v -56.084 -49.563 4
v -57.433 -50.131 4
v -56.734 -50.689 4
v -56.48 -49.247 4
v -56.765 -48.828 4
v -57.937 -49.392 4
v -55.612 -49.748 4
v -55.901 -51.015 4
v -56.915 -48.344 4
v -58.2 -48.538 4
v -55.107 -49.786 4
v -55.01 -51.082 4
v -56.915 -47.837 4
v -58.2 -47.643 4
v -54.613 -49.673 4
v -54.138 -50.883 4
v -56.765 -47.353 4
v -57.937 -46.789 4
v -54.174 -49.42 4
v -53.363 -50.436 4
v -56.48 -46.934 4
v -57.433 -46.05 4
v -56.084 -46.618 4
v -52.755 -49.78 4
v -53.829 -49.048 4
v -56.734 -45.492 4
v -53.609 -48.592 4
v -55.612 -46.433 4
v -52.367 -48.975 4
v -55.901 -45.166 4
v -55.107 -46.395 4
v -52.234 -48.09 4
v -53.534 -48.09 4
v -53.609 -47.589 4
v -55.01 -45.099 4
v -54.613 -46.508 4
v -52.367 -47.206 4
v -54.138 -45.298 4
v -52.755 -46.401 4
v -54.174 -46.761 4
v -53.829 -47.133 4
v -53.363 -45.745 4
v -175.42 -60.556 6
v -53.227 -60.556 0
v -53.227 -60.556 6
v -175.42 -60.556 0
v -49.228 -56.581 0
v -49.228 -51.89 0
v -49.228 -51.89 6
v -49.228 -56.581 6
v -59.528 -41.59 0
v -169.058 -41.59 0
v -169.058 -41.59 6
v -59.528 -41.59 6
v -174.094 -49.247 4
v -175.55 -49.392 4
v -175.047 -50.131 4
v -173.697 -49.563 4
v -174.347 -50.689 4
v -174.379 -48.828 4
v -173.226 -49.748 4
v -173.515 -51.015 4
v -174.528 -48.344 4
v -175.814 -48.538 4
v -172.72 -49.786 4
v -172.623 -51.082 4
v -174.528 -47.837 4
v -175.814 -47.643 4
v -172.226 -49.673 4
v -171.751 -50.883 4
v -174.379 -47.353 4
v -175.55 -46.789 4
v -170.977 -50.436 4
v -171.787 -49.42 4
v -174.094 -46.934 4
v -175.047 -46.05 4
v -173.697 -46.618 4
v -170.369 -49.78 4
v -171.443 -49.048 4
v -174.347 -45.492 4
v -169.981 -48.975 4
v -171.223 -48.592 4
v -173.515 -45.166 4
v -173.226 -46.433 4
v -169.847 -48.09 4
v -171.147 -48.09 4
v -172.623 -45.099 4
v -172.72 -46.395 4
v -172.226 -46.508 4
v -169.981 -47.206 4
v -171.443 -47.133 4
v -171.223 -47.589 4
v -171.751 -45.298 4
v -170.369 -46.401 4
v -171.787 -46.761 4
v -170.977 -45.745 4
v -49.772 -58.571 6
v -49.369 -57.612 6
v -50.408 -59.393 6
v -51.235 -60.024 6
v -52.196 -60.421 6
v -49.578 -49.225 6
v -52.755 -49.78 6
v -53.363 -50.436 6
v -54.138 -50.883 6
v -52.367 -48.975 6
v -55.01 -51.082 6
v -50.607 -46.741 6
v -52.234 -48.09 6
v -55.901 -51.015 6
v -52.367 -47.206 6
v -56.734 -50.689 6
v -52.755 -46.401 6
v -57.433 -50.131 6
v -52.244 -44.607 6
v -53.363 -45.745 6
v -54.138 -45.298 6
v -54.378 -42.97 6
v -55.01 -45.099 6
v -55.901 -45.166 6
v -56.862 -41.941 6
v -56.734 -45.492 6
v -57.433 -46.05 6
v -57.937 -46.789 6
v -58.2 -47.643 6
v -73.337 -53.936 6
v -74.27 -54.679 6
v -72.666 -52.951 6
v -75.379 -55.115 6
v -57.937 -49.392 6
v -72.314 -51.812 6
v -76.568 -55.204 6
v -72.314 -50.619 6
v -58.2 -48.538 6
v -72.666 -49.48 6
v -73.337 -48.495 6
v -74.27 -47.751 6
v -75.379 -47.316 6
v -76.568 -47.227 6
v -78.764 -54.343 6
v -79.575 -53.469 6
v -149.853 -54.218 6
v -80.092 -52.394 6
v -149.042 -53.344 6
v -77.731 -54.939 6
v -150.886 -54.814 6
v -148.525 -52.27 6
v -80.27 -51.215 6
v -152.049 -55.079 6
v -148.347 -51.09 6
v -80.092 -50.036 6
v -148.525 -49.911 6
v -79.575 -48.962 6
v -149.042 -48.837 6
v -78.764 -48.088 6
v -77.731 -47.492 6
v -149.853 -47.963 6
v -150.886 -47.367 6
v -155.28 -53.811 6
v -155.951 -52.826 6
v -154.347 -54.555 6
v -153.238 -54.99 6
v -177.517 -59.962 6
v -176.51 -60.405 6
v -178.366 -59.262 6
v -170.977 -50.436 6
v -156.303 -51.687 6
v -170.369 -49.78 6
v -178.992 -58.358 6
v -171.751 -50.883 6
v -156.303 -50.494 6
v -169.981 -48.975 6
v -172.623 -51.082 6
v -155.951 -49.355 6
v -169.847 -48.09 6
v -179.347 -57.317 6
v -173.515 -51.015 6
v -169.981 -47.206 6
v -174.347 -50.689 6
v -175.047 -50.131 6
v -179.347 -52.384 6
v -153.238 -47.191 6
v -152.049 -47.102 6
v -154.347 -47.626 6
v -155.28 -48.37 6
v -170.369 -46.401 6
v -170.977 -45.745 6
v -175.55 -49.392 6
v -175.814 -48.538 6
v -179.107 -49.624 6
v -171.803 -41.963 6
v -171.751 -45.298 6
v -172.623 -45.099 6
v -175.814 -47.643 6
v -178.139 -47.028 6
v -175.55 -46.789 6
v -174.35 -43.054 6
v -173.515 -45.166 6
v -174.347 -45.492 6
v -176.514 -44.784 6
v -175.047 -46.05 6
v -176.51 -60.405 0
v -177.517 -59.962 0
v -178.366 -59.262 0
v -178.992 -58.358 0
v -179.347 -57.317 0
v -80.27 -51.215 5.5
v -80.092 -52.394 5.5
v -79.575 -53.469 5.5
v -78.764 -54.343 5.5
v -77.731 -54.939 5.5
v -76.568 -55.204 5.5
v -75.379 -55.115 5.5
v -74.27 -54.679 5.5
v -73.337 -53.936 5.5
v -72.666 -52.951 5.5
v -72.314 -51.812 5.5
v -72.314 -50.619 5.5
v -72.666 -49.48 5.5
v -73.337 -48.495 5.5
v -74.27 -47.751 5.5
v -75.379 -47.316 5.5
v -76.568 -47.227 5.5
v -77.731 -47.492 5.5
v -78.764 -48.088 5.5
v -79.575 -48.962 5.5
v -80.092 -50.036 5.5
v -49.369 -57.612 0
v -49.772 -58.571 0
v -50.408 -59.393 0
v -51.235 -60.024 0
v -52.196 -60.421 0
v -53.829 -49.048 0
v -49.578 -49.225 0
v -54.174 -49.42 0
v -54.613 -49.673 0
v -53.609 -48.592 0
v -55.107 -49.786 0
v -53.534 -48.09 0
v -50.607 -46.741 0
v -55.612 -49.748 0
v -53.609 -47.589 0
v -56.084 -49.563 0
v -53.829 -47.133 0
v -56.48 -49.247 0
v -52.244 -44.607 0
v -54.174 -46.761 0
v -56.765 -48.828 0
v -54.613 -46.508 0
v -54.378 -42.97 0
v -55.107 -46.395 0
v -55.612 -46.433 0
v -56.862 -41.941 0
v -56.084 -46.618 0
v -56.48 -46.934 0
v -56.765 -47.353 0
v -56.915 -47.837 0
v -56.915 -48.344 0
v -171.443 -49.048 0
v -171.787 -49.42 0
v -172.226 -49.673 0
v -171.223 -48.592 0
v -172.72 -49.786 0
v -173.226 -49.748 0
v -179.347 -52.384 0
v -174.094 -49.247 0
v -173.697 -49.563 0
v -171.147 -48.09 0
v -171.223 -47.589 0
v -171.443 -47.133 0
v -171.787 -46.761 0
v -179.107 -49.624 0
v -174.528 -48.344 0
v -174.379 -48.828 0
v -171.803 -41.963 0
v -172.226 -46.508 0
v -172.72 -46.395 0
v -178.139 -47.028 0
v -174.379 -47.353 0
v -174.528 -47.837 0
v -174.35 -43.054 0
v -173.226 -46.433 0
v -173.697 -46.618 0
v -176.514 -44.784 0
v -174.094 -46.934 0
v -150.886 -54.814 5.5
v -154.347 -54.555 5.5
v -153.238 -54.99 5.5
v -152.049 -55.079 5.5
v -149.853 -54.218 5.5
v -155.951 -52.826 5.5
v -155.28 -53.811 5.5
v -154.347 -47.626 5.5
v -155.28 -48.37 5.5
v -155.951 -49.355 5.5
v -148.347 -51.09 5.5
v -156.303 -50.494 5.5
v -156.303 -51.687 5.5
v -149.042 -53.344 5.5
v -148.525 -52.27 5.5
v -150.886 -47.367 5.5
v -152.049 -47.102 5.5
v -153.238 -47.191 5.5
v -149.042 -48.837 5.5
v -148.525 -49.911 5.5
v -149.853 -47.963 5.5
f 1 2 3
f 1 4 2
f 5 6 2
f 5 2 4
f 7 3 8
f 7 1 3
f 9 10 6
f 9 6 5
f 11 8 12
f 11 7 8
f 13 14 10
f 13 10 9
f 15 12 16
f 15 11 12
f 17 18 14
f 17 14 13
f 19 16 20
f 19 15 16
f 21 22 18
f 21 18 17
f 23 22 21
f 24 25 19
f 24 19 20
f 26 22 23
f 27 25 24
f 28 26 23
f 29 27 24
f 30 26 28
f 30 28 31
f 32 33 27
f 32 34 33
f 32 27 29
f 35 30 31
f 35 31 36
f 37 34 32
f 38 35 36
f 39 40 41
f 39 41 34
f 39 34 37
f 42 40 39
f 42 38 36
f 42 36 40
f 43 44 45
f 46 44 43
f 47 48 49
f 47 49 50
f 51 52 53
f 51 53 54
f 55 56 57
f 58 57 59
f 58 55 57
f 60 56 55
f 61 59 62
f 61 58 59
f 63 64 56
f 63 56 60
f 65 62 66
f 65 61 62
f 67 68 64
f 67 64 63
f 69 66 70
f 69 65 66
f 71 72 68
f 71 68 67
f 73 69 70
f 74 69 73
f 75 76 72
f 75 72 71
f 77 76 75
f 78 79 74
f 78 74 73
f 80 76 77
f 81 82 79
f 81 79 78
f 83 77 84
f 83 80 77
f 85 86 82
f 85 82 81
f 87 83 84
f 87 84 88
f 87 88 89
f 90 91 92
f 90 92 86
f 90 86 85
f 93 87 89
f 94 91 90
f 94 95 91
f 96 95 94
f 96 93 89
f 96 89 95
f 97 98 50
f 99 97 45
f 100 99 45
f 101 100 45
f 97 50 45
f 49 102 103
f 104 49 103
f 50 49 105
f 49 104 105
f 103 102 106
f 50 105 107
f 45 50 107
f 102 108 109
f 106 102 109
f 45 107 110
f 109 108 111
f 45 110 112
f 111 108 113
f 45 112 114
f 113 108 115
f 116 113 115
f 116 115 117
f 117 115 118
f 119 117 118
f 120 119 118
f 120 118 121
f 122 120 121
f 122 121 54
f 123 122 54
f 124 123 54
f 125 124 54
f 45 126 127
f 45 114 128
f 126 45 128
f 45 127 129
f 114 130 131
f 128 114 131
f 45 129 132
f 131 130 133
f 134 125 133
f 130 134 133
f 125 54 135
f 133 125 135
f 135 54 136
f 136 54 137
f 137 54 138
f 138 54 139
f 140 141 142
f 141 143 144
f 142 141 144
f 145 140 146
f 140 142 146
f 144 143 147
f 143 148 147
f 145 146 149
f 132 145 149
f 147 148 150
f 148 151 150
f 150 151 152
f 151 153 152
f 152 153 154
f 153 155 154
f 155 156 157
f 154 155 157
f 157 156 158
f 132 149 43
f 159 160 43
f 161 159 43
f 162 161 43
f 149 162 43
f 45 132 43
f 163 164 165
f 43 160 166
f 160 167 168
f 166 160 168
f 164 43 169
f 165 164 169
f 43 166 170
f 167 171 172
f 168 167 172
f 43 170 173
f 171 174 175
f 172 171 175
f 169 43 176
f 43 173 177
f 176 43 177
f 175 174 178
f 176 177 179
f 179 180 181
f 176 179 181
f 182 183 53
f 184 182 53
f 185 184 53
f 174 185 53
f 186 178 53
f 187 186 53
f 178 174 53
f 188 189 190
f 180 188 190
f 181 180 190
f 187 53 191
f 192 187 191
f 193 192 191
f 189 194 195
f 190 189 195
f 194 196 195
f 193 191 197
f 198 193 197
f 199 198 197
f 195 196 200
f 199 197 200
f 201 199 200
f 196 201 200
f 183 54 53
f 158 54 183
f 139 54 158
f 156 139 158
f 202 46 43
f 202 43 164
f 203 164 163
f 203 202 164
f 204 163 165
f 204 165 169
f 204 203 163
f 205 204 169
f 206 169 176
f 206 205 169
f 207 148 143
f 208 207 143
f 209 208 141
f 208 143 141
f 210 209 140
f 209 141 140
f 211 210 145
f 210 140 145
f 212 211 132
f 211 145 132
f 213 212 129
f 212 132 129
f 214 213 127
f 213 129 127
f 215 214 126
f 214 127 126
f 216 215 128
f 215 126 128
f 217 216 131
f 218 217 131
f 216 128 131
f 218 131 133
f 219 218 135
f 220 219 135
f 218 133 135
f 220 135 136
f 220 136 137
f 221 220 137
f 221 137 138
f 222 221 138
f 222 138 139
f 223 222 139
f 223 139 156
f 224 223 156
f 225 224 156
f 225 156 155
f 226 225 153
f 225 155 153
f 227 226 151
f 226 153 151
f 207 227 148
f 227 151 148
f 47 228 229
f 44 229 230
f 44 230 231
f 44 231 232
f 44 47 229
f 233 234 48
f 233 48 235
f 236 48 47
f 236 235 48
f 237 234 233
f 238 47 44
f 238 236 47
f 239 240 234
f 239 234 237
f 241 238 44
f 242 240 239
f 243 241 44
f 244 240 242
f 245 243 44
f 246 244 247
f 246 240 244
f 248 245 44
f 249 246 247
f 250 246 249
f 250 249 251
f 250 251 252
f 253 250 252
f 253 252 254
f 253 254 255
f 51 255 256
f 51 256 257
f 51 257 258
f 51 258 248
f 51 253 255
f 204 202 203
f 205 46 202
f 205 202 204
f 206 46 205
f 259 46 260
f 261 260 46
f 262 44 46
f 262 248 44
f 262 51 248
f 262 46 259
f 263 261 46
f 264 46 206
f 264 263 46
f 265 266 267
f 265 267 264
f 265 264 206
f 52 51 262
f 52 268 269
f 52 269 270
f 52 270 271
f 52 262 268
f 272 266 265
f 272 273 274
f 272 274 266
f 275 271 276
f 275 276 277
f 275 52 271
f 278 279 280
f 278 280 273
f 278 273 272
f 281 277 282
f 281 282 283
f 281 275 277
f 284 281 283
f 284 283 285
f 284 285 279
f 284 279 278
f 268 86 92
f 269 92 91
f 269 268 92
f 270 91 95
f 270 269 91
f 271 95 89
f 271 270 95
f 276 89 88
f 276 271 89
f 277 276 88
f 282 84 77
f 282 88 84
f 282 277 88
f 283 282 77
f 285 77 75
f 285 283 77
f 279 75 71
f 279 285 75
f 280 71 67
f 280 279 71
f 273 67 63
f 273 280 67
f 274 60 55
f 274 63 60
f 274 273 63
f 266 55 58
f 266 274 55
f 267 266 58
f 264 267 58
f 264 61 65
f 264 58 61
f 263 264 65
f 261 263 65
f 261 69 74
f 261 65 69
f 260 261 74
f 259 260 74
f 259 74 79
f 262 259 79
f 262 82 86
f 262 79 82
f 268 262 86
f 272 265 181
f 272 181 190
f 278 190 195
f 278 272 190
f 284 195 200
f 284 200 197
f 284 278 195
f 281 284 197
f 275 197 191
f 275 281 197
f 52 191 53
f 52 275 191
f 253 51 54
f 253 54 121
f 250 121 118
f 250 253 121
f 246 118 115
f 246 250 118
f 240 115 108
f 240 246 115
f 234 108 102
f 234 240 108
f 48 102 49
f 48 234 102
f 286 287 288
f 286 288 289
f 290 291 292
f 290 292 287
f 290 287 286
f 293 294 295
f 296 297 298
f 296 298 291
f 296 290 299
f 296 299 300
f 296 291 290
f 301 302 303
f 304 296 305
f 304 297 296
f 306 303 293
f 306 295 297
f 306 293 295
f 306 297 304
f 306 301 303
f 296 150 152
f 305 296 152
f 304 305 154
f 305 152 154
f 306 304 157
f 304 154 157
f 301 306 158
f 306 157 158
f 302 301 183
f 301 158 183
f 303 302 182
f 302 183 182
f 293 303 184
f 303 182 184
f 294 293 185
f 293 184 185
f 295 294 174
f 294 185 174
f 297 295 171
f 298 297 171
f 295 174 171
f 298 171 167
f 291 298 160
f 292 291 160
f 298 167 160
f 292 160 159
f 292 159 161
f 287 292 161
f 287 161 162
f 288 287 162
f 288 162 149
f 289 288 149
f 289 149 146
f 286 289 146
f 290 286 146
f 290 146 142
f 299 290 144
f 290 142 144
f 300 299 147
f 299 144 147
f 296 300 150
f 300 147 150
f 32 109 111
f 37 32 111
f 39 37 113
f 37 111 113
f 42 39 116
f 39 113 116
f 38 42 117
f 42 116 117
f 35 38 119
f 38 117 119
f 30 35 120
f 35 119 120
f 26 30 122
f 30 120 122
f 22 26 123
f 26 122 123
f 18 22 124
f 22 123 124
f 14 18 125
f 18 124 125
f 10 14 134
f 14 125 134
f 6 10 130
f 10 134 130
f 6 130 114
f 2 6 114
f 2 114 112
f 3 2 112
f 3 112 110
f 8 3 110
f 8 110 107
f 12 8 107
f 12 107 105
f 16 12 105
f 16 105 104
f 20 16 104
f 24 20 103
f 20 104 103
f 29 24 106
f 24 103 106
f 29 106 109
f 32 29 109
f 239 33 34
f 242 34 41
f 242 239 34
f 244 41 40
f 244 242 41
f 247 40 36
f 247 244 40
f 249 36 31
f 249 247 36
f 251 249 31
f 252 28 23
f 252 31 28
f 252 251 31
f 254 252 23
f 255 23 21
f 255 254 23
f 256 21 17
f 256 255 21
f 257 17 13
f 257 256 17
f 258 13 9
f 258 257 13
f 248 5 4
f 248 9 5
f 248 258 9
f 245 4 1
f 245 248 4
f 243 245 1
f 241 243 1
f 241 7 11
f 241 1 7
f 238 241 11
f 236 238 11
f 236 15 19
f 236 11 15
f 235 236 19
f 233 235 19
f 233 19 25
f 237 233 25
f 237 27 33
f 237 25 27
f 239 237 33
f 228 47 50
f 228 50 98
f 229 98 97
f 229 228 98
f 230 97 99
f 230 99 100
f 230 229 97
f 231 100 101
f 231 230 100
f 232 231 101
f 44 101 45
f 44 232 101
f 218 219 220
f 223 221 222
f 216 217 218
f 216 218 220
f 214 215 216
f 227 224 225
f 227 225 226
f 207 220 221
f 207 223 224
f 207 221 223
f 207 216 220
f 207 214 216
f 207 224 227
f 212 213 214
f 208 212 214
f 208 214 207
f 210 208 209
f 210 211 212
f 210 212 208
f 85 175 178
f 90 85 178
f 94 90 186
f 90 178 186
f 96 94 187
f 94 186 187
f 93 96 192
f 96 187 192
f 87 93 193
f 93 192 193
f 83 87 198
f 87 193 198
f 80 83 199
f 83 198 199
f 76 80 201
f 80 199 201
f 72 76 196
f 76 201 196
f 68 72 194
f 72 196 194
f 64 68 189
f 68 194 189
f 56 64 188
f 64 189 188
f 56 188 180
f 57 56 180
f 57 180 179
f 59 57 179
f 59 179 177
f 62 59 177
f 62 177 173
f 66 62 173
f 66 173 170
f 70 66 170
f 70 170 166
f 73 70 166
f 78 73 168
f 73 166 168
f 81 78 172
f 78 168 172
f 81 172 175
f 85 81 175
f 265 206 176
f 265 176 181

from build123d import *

# Parameters (mm, degrees)
SKIZZE1_R                       = 1.7
AUFSATZ_LINEAR_AUSTRAGEN1_DEPTH = 6
SKIZZE2_R                       = 4
SCHNITT_LINEAR_AUSTRAGEN1_DEPTH = 0.5
SKIZZE3_R                       = 3
SCHNITT_LINEAR_AUSTRAGEN2_DEPTH = 2


with BuildPart() as part:
    # Skizze1 → Aufsatz-Linear austragen1 (new body)
    with BuildSketch(Plane.XY):
        with BuildLine():
            Line((-49.2275, -51.8905), (-49.2275, -56.581162408))
            ThreePointArc((-49.2275, -56.581162408), (-50.407885162, -59.393344486), (-53.227421196, -60.556054132))
            Line((-53.227421196, -60.556054132), (-175.420431309, -60.556054132))
            ThreePointArc((-175.420431309, -60.556054132), (-177.965722471, -59.641745773), (-179.34742314, -57.316800583))
            Line((-179.34742314, -57.316800583), (-179.34742314, -52.3842))
            ThreePointArc((-179.34742314, -52.3842), (-176.514207067, -44.783915623), (-169.0581, -41.5905))
            Line((-169.0581, -41.5905), (-59.5275, -41.5905))
            ThreePointArc((-59.5275, -41.5905), (-52.244300154, -44.607300154), (-49.2275, -51.8905))
        make_face()
        with Locations((-55.2338, -48.0905)):
            Circle(SKIZZE1_R, mode=Mode.SUBTRACT)
        with Locations((-172.84742314, -48.0905)):
            Circle(SKIZZE1_R, mode=Mode.SUBTRACT)
    extrude(amount=AUFSATZ_LINEAR_AUSTRAGEN1_DEPTH)

    # Skizze2 → Schnitt-Linear austragen1 (cut)
    with BuildSketch(Plane.XY.offset(6)):
        with Locations((-152.34742314, -51.0905)):
            Circle(SKIZZE2_R)
        with Locations(Location((-76.269564564, -51.215358923, 0), (0, 0, 180))):
            Circle(SKIZZE2_R)
    extrude(amount=-SCHNITT_LINEAR_AUSTRAGEN1_DEPTH, mode=Mode.SUBTRACT)

    # Skizze3 → Schnitt-Linear austragen2 (cut)
    with BuildSketch(Plane.XY.offset(6)):
        with Locations((-172.84742314, -48.0905)):
            Circle(SKIZZE3_R)
        with Locations((-55.2338, -48.0905)):
            Circle(SKIZZE3_R)
    extrude(amount=-SCHNITT_LINEAR_AUSTRAGEN2_DEPTH, mode=Mode.SUBTRACT)


solid = part.part
